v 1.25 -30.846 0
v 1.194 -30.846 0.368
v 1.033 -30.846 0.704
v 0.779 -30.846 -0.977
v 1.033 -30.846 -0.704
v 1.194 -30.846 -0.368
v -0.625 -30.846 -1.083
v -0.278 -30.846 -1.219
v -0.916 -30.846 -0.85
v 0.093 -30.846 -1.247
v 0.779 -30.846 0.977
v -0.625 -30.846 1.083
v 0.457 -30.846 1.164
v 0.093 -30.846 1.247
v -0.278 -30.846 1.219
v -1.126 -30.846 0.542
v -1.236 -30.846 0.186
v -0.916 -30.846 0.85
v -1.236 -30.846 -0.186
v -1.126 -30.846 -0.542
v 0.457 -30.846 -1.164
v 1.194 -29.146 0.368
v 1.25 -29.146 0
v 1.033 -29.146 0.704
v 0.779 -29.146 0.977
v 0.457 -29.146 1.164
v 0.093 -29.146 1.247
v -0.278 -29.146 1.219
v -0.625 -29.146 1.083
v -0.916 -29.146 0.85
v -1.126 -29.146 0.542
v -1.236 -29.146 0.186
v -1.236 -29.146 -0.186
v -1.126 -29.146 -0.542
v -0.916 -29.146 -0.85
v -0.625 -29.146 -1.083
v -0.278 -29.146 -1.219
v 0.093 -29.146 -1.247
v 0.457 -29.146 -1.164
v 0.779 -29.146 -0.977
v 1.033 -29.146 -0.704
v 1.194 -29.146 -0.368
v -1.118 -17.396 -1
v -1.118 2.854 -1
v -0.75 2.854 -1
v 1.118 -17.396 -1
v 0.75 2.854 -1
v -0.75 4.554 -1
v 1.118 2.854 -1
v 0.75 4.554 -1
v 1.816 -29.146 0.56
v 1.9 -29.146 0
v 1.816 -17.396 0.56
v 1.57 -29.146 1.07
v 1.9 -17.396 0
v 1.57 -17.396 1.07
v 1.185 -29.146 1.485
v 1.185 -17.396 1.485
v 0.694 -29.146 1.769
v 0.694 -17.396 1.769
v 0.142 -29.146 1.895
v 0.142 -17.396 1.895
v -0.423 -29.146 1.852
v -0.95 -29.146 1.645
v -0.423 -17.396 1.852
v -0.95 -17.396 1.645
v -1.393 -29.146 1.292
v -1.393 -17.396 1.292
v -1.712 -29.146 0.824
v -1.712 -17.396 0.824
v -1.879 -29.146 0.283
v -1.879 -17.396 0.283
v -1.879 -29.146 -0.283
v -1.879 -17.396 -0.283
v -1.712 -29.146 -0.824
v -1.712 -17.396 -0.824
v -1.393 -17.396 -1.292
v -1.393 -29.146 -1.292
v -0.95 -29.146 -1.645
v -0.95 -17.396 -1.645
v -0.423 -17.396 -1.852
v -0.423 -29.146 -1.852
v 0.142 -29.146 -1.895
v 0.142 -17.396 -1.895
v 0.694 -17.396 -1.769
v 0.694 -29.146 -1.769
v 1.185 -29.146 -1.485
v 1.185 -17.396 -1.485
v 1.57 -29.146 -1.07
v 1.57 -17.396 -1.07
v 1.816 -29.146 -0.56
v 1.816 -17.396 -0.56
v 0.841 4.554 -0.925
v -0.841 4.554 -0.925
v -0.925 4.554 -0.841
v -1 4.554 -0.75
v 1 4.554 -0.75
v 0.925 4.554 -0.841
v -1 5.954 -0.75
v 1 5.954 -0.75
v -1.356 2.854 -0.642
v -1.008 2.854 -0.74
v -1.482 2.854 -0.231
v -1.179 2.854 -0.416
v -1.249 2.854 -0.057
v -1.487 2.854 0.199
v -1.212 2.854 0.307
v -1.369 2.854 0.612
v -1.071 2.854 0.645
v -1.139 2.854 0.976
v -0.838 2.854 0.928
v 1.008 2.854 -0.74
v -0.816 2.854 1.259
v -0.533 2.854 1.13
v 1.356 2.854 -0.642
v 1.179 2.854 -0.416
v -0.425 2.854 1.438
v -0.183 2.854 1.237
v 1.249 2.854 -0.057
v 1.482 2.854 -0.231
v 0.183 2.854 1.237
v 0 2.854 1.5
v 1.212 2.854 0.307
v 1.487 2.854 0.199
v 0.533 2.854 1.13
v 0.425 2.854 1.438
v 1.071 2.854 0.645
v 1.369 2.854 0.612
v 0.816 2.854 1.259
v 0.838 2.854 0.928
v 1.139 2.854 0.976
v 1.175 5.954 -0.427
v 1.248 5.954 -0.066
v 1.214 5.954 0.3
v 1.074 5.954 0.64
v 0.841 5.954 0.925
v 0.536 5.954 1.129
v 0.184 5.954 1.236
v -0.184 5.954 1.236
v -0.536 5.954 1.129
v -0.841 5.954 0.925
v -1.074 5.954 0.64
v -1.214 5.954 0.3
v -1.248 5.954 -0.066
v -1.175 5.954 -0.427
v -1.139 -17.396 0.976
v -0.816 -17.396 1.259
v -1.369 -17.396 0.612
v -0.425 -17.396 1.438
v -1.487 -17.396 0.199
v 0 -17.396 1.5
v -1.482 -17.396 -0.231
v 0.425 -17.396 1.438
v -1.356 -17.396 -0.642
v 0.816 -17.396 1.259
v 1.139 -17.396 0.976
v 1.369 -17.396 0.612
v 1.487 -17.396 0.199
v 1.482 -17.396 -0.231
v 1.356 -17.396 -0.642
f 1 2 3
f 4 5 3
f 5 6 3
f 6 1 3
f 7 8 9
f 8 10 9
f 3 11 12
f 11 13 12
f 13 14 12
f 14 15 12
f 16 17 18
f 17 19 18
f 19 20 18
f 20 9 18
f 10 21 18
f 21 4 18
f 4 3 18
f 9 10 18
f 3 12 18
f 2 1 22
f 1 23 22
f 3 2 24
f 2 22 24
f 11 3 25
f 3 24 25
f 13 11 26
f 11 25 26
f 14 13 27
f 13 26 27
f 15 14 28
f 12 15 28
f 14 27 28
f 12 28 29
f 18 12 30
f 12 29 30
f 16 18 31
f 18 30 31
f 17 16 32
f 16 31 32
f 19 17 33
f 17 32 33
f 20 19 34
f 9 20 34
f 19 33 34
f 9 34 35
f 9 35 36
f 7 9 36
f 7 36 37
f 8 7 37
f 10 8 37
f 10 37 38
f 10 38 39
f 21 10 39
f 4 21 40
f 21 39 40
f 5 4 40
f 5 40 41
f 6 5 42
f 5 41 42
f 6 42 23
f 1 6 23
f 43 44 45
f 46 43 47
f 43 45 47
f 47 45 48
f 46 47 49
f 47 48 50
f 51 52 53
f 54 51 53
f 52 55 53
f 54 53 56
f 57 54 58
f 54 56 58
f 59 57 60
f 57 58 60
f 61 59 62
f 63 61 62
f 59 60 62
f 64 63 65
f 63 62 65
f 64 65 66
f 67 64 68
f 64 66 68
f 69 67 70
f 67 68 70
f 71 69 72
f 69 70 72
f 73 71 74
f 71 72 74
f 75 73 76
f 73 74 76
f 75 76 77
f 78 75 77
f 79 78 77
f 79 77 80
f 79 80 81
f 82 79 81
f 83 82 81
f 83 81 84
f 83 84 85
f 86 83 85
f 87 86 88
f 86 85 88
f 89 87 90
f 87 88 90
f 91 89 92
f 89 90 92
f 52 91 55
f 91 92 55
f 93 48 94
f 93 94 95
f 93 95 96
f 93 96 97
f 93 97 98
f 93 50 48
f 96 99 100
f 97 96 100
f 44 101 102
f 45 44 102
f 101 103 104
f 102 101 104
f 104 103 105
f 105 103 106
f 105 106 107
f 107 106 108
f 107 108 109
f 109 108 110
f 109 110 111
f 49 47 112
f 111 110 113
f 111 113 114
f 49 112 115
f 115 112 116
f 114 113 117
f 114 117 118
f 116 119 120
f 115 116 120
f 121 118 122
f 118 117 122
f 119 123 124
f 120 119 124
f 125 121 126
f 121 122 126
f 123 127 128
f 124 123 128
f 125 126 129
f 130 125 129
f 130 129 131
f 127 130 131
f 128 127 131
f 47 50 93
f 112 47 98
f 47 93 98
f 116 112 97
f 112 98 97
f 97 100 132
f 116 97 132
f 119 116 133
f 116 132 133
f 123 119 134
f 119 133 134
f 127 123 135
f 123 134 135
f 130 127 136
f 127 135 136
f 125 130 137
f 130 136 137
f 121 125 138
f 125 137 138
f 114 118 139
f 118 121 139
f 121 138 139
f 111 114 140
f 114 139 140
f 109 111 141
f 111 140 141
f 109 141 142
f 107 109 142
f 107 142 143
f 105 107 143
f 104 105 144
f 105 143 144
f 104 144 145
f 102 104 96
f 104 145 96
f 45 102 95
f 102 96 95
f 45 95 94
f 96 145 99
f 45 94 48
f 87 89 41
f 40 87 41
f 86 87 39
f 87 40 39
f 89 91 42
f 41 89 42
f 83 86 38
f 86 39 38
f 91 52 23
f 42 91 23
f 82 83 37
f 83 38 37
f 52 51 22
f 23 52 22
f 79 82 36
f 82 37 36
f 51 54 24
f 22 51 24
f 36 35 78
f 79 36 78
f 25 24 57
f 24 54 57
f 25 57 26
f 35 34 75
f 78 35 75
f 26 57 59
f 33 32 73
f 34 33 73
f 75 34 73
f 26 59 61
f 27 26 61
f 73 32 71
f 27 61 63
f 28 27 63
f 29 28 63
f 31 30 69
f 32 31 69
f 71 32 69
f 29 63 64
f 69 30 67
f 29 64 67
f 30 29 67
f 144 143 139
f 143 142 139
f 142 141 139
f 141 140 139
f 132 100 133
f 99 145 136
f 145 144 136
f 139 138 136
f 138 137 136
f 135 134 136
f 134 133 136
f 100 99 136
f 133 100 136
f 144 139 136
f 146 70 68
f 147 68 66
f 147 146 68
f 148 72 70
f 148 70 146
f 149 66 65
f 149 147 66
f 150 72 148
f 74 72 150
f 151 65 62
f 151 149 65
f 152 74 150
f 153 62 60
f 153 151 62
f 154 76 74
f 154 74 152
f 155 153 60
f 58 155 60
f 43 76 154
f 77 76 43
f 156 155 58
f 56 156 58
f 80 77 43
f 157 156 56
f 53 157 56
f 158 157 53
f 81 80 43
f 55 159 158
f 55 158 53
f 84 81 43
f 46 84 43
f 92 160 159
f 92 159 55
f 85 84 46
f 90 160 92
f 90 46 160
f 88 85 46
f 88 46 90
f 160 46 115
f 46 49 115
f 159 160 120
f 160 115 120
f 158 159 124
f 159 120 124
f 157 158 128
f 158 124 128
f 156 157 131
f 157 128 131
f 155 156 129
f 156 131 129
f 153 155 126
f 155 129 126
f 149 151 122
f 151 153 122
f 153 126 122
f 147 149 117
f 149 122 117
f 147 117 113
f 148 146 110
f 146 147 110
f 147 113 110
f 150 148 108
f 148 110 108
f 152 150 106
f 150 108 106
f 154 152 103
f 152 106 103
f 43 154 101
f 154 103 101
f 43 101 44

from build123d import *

# Parameters (mm, degrees)
CUT_EXTRUDE_2_DEPTH = 23.35
CUT_EXTRUDE_3_DEPTH = 1.4


with BuildPart() as part:
    # 草图1 → 旋转2 (revolve)
    with BuildSketch(Plane.XY):
        Polygon((1.25, 5.954469818), (0, 5.954469818), (0, -30.845530182), (1.25, -30.845530182), (1.25, -29.145530182), (1.9, -29.145530182), (1.9, -17.395530182), (1.5, -17.395530182), (1.5, 2.854469818), (1.25, 2.854469818), align=None)
    revolve(axis=Axis((0, 5.954469818, 0), (0, -1, 0)))

    # 草图4 → 切除-拉伸2 (cut)
    with BuildSketch(Plane(origin=(0, 5.954469818, 0), x_dir=(1, 0, 0), z_dir=(0, 1, 0))):
        with BuildLine():
            Line((-1.118033989, 1), (1.118033989, 1))
            ThreePointArc((1.118033989, 1), (0, 1.5), (-1.118033989, 1))
        make_face()
    extrude(amount=-CUT_EXTRUDE_2_DEPTH, mode=Mode.SUBTRACT)

    # 草图5 → 切除-拉伸3 (cut)
    with BuildSketch(Plane(origin=(0, 5.954469818, 0), x_dir=(1, 0, 0), z_dir=(0, 1, 0))):
        with BuildLine():
            Line((-1, 0.75), (1, 0.75))
            ThreePointArc((1, 0.75), (0, 1.25), (-1, 0.75))
        make_face()
    extrude(amount=-CUT_EXTRUDE_3_DEPTH, mode=Mode.SUBTRACT)


solid = part.part
